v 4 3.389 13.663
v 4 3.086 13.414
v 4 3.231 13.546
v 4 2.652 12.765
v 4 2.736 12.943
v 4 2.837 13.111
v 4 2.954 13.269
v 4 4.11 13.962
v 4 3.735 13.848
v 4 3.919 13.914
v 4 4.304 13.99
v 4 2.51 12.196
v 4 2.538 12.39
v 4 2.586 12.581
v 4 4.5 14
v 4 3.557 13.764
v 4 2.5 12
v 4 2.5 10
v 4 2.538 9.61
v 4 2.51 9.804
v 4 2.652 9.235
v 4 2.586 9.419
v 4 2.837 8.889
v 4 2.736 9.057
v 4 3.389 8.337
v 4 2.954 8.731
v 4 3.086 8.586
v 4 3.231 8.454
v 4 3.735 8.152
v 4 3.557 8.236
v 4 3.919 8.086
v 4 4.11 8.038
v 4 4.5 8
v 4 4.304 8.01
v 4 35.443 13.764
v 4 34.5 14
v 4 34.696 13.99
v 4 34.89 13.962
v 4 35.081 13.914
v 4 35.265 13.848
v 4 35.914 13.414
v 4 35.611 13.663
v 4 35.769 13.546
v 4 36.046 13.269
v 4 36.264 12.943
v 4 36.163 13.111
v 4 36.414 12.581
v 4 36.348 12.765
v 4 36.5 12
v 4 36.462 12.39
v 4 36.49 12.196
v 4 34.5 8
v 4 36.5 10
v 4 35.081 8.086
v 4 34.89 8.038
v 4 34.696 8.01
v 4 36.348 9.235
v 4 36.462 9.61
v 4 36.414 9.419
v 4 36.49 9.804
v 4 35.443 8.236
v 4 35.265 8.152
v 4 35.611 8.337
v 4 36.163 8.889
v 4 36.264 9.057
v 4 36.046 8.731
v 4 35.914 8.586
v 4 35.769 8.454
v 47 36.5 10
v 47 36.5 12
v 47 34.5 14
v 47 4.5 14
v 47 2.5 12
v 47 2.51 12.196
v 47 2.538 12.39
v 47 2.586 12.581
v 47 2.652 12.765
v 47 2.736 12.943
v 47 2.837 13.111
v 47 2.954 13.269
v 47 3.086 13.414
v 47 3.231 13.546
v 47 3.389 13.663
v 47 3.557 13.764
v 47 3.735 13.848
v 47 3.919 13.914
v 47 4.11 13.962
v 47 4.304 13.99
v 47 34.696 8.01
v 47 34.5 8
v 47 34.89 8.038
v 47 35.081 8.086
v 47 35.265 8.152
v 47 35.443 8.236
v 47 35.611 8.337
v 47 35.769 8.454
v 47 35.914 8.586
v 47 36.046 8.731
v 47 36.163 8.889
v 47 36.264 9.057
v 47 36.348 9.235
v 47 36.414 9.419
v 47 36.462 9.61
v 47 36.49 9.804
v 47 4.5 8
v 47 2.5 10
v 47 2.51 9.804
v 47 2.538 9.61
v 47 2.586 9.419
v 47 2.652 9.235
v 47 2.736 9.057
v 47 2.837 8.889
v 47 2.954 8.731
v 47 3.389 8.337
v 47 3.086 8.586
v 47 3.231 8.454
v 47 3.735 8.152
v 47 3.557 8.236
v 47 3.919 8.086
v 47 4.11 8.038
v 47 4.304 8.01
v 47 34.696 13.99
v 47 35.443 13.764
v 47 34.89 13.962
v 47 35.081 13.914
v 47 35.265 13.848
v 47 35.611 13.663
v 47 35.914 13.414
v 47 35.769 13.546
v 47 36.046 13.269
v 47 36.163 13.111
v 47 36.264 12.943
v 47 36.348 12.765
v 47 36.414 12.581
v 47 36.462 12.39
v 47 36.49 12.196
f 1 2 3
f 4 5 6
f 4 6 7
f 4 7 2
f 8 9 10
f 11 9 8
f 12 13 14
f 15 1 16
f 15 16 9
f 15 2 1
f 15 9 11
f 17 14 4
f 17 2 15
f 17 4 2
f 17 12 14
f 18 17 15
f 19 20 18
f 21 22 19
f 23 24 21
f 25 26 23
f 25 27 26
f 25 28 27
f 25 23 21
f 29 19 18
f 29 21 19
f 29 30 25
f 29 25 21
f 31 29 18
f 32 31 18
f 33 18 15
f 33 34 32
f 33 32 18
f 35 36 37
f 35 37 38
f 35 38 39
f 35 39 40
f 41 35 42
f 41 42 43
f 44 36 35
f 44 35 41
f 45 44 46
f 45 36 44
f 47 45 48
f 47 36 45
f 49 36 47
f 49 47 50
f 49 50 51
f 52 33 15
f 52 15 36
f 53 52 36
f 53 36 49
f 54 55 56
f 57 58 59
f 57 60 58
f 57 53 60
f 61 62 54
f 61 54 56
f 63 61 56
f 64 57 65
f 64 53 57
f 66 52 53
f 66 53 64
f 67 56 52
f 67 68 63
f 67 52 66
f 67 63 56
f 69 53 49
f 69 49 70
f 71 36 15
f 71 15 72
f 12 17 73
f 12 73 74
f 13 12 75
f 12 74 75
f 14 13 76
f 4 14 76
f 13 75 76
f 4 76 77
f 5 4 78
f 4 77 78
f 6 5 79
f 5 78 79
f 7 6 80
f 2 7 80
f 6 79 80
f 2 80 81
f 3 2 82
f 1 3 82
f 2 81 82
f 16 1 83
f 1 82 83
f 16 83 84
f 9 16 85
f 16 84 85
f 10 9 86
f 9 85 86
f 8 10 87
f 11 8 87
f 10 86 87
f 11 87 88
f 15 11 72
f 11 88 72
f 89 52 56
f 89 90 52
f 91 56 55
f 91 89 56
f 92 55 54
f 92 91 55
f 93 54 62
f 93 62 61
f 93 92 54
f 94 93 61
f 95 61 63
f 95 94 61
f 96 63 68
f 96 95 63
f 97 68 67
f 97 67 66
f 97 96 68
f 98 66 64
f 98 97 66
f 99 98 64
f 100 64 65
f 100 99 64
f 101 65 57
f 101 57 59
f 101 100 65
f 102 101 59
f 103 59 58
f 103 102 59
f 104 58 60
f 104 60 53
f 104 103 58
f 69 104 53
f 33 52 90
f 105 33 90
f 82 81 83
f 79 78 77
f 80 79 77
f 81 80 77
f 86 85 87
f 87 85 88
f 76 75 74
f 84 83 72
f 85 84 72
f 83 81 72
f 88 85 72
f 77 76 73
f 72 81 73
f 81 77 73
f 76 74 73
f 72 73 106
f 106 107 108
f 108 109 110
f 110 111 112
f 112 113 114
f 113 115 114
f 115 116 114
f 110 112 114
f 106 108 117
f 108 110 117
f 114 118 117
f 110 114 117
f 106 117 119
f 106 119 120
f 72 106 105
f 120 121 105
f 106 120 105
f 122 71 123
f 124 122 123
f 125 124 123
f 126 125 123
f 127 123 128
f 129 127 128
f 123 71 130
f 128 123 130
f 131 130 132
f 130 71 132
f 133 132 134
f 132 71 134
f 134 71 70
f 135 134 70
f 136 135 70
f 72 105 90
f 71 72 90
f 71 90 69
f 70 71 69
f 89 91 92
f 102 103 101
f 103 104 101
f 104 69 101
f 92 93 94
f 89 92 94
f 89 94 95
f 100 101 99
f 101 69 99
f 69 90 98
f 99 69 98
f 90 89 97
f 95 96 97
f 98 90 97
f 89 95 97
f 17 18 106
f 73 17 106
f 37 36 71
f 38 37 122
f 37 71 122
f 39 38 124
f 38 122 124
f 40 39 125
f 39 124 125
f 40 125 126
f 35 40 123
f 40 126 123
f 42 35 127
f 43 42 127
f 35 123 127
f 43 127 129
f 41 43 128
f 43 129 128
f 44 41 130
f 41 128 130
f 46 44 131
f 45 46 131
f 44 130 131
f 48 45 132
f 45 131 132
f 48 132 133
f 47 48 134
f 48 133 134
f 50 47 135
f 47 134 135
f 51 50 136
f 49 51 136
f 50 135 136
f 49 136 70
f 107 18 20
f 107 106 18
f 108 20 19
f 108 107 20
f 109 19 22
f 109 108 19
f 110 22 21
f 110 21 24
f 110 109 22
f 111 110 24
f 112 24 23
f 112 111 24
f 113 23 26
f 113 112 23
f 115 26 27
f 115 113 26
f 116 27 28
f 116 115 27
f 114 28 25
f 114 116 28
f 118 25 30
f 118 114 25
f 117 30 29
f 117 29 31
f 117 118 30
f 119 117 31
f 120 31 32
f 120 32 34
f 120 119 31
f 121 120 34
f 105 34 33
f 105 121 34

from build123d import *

# Parameters (mm, degrees)
BOX_W       = 43
BOX_H       = 34
BOX_DEPTH   = 6
FILLET002_R = 2
FILLET003_R = 2


with BuildPart() as part:
    # Box → Box (new body)
    with BuildSketch(Plane.XY):
        with Locations((21.5, 17)):
            Rectangle(BOX_W, BOX_H)
    extrude(amount=BOX_DEPTH)

    # Fillet002
    fillet002_edges = [part.edges().sort_by_distance(p)[0] for p in [
        (21.5, 0, 6),
        (21.5, 0, 0),
    ]]
    fillet(fillet002_edges, radius=FILLET002_R)

    # Fillet003
    fillet003_edges = [part.edges().sort_by_distance(p)[0] for p in [
        (21.5, 34, 0),
        (21.5, 34, 6),
    ]]
    fillet(fillet003_edges, radius=FILLET003_R)


with BuildPart() as part_1:
    # Body011 placement: moved
    add(part.part.moved(Location((4, 2.5, 8))))


solid = part_1.part
